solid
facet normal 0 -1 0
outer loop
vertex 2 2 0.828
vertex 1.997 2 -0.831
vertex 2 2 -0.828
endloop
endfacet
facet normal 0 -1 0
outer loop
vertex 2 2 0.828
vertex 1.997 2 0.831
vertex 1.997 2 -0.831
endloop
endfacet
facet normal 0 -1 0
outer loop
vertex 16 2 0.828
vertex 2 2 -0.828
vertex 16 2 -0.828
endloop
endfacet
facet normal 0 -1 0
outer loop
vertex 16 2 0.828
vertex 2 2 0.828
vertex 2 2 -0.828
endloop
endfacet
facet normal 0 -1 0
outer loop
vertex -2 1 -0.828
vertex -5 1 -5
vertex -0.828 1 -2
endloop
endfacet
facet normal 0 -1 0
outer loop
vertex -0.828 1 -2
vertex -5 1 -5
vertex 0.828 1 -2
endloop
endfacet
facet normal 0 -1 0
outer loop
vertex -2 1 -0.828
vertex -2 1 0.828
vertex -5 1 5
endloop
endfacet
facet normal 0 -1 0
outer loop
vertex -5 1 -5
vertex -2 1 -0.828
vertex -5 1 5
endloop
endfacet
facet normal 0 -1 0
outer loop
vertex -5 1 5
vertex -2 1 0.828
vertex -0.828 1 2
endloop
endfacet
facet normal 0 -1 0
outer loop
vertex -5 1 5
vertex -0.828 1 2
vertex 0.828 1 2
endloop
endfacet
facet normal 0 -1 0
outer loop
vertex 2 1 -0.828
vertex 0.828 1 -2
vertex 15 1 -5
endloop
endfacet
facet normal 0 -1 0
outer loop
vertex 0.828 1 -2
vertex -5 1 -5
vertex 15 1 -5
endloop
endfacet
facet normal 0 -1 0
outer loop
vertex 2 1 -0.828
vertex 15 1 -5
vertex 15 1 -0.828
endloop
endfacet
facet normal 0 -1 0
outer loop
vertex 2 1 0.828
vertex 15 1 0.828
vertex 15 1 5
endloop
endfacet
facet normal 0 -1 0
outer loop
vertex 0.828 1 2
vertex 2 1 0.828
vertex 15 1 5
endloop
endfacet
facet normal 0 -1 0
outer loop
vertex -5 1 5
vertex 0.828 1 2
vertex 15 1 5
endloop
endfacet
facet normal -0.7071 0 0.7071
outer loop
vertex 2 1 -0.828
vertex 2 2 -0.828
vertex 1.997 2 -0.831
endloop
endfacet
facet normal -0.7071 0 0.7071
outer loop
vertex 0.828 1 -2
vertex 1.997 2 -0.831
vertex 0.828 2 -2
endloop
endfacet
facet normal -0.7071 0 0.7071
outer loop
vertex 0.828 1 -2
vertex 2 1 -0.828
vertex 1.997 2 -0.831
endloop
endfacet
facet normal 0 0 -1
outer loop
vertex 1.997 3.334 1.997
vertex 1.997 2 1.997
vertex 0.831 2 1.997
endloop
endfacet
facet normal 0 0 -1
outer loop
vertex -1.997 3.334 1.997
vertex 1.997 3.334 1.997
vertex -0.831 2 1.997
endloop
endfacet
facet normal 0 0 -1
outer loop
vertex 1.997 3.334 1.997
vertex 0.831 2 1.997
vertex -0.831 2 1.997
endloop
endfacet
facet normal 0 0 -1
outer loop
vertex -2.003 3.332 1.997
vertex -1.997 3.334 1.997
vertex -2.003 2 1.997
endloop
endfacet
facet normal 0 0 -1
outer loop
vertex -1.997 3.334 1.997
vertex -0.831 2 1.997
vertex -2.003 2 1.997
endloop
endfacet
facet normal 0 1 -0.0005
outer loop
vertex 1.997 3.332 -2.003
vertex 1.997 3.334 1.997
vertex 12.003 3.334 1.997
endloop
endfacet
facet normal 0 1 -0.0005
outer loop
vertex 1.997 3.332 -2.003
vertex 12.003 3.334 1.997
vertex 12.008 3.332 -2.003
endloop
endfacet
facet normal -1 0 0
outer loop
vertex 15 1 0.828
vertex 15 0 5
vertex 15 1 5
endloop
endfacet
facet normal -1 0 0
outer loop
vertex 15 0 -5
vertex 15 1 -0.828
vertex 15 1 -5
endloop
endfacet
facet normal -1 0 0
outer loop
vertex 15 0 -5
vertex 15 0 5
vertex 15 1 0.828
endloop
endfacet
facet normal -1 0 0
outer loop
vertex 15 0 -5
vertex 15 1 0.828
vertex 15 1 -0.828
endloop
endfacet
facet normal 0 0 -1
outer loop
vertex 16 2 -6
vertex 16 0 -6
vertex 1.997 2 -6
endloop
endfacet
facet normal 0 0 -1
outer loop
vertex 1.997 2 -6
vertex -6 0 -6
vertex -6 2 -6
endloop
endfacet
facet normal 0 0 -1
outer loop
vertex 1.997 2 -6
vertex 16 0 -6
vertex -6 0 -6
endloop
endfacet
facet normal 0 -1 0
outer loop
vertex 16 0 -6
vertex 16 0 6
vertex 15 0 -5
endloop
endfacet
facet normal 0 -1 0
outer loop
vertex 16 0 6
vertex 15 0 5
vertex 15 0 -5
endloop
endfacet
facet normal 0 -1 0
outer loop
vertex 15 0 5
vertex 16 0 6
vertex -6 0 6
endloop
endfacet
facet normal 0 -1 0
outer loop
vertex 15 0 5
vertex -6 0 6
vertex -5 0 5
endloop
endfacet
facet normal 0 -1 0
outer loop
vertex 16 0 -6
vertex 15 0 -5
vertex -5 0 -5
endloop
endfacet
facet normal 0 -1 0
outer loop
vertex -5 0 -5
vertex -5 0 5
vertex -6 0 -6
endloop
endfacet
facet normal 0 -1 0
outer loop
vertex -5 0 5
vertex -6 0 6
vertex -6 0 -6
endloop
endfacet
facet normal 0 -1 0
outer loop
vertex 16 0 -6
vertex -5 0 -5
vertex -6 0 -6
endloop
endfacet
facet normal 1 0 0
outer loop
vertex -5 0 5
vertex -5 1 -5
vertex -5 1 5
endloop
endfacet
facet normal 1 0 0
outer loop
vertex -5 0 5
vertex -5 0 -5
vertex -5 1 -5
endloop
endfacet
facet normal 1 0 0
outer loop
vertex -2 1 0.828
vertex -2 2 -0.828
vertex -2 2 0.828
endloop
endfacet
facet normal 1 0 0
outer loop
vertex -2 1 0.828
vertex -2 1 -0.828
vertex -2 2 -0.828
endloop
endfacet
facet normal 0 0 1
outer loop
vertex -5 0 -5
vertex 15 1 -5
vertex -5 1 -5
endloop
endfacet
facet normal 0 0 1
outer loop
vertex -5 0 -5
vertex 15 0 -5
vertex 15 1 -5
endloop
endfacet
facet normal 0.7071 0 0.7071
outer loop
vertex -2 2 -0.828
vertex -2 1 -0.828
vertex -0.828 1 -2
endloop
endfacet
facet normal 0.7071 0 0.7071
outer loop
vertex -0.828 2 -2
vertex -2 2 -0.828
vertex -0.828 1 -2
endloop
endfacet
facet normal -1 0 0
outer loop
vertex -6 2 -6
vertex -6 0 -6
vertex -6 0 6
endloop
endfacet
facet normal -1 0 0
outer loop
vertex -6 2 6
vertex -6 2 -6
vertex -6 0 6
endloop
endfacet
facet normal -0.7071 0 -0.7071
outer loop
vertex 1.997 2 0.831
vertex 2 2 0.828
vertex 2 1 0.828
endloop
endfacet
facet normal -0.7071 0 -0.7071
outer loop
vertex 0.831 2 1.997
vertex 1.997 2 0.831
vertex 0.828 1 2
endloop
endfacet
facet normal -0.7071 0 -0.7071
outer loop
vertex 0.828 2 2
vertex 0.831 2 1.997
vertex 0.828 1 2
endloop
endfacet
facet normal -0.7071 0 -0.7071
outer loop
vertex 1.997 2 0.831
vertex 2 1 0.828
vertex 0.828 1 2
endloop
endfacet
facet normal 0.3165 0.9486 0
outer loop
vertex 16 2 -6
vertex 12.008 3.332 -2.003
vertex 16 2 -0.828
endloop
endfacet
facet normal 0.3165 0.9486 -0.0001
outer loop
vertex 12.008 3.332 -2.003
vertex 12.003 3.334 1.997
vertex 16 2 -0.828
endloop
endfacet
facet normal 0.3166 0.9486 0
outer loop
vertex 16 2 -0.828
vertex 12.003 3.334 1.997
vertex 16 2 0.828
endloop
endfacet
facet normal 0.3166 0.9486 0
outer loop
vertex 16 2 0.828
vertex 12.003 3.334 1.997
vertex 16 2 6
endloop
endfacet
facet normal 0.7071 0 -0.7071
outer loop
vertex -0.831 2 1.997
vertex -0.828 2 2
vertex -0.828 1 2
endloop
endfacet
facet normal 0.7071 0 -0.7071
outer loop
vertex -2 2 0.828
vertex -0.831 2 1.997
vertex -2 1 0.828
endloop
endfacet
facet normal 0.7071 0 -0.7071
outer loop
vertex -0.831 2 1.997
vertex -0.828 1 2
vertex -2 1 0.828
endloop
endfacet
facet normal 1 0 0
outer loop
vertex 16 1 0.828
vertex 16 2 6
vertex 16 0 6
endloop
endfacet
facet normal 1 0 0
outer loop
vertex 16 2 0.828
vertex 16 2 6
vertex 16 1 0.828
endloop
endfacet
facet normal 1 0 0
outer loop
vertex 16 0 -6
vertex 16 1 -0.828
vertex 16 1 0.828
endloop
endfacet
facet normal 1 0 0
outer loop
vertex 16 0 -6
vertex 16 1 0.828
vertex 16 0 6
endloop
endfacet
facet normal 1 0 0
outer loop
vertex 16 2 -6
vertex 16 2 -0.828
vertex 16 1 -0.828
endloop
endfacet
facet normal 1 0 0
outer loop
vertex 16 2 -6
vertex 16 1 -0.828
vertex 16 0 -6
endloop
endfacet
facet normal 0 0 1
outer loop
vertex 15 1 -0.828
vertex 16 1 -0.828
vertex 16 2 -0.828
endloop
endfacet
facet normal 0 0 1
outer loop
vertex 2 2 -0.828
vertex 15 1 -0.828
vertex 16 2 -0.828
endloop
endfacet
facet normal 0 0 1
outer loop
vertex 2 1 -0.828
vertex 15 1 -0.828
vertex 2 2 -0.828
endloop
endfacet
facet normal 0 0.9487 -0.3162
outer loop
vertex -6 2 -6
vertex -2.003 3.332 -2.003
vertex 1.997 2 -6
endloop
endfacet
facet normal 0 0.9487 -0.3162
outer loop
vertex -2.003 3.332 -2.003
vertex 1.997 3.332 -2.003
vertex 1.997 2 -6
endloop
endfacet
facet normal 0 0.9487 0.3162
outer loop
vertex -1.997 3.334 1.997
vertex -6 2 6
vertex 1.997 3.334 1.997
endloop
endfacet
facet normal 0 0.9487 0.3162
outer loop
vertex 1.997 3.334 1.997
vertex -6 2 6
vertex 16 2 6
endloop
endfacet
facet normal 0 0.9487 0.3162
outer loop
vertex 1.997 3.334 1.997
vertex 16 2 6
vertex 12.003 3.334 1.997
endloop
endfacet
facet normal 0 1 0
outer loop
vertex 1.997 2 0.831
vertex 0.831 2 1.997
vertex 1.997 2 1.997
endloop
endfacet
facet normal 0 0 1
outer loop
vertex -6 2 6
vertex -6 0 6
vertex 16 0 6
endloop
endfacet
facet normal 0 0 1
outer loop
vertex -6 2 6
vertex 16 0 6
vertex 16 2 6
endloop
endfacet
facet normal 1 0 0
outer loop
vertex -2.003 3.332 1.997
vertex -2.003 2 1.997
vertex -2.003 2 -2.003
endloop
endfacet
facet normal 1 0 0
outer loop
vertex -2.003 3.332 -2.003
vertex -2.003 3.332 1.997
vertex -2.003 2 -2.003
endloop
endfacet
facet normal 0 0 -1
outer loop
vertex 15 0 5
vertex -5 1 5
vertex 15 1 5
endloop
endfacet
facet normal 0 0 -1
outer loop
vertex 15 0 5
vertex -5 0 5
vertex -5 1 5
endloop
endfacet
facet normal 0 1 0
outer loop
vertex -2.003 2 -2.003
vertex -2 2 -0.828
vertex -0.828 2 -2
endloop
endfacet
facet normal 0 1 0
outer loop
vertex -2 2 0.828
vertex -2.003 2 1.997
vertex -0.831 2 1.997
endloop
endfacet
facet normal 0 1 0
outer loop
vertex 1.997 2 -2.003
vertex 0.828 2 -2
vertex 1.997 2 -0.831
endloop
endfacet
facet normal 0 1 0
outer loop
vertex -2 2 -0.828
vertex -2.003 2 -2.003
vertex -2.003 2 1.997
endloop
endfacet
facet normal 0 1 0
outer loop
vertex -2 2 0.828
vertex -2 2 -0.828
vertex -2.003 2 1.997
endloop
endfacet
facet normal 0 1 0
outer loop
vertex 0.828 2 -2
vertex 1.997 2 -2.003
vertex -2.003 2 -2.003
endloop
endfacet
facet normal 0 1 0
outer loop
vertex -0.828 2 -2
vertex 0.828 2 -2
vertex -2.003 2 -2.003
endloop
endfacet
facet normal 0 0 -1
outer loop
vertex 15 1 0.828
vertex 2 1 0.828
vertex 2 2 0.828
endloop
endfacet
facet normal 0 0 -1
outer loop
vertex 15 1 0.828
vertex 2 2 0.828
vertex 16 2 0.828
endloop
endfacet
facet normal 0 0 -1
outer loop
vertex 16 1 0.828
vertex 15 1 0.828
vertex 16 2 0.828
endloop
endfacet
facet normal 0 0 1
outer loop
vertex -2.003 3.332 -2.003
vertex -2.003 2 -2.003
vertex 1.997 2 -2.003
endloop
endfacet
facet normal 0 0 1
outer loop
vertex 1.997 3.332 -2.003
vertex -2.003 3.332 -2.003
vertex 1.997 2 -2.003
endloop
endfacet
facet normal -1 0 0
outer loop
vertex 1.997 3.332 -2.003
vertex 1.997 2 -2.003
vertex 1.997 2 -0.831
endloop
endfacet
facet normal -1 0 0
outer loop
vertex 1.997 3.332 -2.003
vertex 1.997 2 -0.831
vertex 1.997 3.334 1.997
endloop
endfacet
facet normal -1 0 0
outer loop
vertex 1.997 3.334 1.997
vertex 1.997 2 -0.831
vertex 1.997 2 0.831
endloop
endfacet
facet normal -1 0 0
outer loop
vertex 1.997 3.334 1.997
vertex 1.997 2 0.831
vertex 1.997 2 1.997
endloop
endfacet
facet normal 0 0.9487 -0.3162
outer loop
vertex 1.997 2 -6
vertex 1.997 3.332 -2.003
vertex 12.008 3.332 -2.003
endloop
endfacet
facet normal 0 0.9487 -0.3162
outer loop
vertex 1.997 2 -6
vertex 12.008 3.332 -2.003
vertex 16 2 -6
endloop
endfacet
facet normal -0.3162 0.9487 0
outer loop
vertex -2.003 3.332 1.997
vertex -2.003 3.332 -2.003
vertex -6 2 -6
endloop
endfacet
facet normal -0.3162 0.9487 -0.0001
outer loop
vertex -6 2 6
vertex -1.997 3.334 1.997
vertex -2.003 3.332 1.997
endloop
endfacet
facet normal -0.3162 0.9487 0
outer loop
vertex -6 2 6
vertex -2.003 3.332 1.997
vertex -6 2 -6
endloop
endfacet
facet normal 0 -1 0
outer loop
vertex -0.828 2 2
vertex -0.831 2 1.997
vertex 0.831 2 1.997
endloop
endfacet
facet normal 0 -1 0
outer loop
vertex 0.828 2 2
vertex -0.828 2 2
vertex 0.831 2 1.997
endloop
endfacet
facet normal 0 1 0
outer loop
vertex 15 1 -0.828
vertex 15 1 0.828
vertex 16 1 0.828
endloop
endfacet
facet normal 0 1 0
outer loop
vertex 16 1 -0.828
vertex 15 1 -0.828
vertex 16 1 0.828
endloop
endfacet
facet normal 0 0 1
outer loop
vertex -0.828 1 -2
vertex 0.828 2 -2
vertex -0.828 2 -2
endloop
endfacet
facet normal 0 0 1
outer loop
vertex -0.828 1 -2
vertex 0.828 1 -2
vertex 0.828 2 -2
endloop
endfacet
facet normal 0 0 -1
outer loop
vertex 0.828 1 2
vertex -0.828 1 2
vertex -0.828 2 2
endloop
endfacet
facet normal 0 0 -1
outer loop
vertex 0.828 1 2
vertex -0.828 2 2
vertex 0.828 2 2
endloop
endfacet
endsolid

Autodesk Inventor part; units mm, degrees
ref_plane "YZ Plane" through (0, 0, 0) normal (1, 0, 0) x (0, 1, 0)
ref_plane "XZ Plane" through (0, 0, 0) normal (0, 1, 0) x (-1, 0, 0)
ref_plane "XY Plane" through (0, 0, 0) normal (0, 0, 1) x (1, 0, 0)
sketch "Sketch1" plane through (0, 0, 0) normal (0, 1, 0) x (-1, 0, 0)
  line L0 (5, 5) -> (-5, 5)
  line L1 (-5, 5) -> (-5, -5)
  line L2 (-5, -5) -> (5, -5)
  line L3 (5, -5) -> (5, 5)
  line L4 (6, 6) -> (-6, 6)
  line L5 (-6, 6) -> (-6, -6)
  line L6 (-6, -6) -> (6, -6)
  line L7 (6, -6) -> (6, 6)
  point P0 (0, 0)
  dimension "d0" = 10
  dimension "d1" = 10
  dimension "d2" = 5
  dimension "d3" = 5
  dimension "d4" = 12
  dimension "d5" = 12
  dimension "d6" = 1
  dimension "d7" = 1
extrude "Extrusion1" add sketch "Sketch1" along normal blind 2
sketch "Sketch2" plane through (6, 0, 6) normal (1, 0, 0) x (0, 0, -1)
  line L0 (0, 0) -> (0, 2) projected
  line L1 (12, 0) -> (12, 2) projected
  line L2 (0, 2) -> (12, 2)
  line L3 (12, 2) -> (12, 1)
  line L4 (12, 1) -> (0, 1)
  line L5 (0, 1) -> (0, 2)
  point P0 (6, 0)
extrude "Extrusion2" add sketch "Sketch2" against normal blind 11.5
sketch "Sketch3" plane through (0, 2, 0) normal (0, 1, 0) x (1, 0, 0)
  line L0 (-2, -2) -> (2, -2)
  line L1 (2, -2) -> (2, 2)
  line L2 (2, 2) -> (-2, 2)
  line L3 (-2, 2) -> (-2, -2)
  circle A0 centre (0, 0) radius 2.8284
  line L4 (0, -2.8284) -> (-2.8284, 0)
  line L5 (-2.8284, 0) -> (0, 2.8284)
  line L6 (2.8284, 0) -> (0, 2.8284)
  line L7 (2.8284, 0) -> (0, -2.8284)
  point P0 (0.8284, -2)
  point P1 (2, -0.8284)
  point P2 (2, 0.8284)
  point P3 (0.8284, 2)
  point P4 (-0.8284, 2)
  point P5 (-2, 0.8284)
  point P6 (-2, -0.8284)
  point P7 (-0.8284, -2)
  dimension "d13" = 4
  dimension "d14" = 4
  dimension "d15" = 2
  dimension "d16" = 2
extrude "Extrusion3" cut sketch "Sketch3" along normal blind 23.25 and the other way blind 11.625 contours L4 L3 L5 L2 L6 L1 L7 L0
sketch "Sketch4" plane through (0, 2, 0) normal (0, 1, 0) x (1, 0, 0)
  line L0 (2, -0.8284) -> (2, 0.8284) projected
  line L1 (2, -0.8284) -> (2.8765, -0.8284)
  line L2 (2.8765, -0.8284) -> (2.8765, 0.8284)
  line L3 (2.8765, 0.8284) -> (2, 0.8284)
  line L4 (2, 0.8284) -> (2, -0.8284)
  line L5 (2.8765, -0.8284) -> (7.5124, -0.8284)
  line L6 (7.5124, -0.8284) -> (7.5124, 0.8284)
  line L7 (7.5124, 0.8284) -> (2.8765, 0.8284)
  line L8 (2.8765, 0.8284) -> (2.8765, -0.8284)
  point P0 (0, 0)
  point P1 (2.8765, 0.8284)
  point P2 (2, 0.8284)
extrude "Extrusion4" cut sketch "Sketch4" against normal blind 1
sketch "Sketch5" plane through (0, 2, 0) normal (0, 1, 0) x (1, 0, 0)
  line L0 (-6, -6) -> (6, -6) projected
  line L1 (6, 0.8284) -> (6, 6) projected
  line L2 (-6, -6) -> (6, -6)
  line L3 (6, -6) -> (6, 6)
  line L4 (6, 6) -> (-6, 6)
  line L5 (-6, 6) -> (-6, -6)
  point P0 (0, 0)
  point P1 (6, -6)
extrude "Extrusion5" add sketch "Sketch5" along normal blind 25
sketch "Sketch6" plane through (6, 0, 6) normal (1, 0, 0) x (0, 0, -1)
  line L0 (5.1716, 1) -> (5.1716, 2) projected
  line L1 (5.1716, 2) -> (-3.596, 2)
  line L2 (0, 0) -> (0, 27) projected
  line L3 (4, 2) -> (5.1716, 2) projected
  line L4 (5.1716, 2) -> (16.1787, 2)
  line L5 (5.1716, 2) -> (6.8284, 2) projected
  line L6 (6, 2) -> (6, 6)
  line L7 (0, 2) -> (6, 4)
  line L8 (6, 4) -> (12, 2)
  line L9 (12, 0) -> (12, 27) projected
  line L10 (12, 2) -> (-2.4689, 2)
  line L11 (-2.4689, 2) -> (-2.4689, 28.669)
  line L12 (-2.4689, 28.669) -> (12, 28.669)
  line L13 (12, 28.669) -> (12, 2)
  point P0 (6, 0)
  dimension "d23" = 4
extrude "Extrusion6" cut sketch "Sketch6" against normal blind 23.25 contours L1 L11 L12 L13 L9 L8 L7
sketch "Sketch7" plane through (-6, 0, 6) normal (0, 0, 1) x (1, 0, 0)
  line L0 (6, 0) -> (6, 4)
  line L1 (12, 4) -> (0, 4) projected
  line L2 (0, 2) -> (12, 2) projected
  line L3 (12, 2) -> (6, 4)
  line L4 (0, 4) -> (0, 2) projected
  line L5 (6, 4) -> (0, 2)
  line L6 (0, 2) -> (13.6732, 2)
  line L7 (13.6732, 2) -> (13.6732, 4.9606)
  line L8 (13.6732, 4.9606) -> (0, 4.9606)
  line L9 (0, 4.9606) -> (0, 2)
extrude "Extrusion7" cut sketch "Sketch7" against normal blind 41.75 contours L5 L4 L1 | L1 L9 L8 L7 L6 L3
sketch "Sketch8" plane through (0, 2, 0) normal (0, -1, 0) x (1, 0, 0)
  line L0 (6, 6) -> (0, 0) projected
  line L1 (1.9974, 1.9974) -> (-2.0026, 1.9974)
  line L2 (-2.0026, 1.9974) -> (-2.0026, -2.0026)
  line L3 (-2.0026, -2.0026) -> (1.9974, -2.0026)
  line L4 (1.9974, -2.0026) -> (1.9974, 1.9974)
  dimension "d30" = 4
  dimension "d31" = 4
extrude "Extrusion8" cut sketch "Sketch8" against normal blind 105
sketch "Sketch9" plane through (6, 0, 6) normal (1, 0, 0) x (0, 0, -1)
  line L0 (0, 0) -> (0, 2) projected
  line L1 (12, 0) -> (12, 2) projected
  line L2 (0, 0) -> (12, 0)
  line L3 (12, 0) -> (12, 2)
  line L4 (12, 2) -> (0, 2)
  line L5 (0, 2) -> (0, 0)
  point P0 (6, 0)
extrude "Extrusion9" add sketch "Sketch9" along normal blind 10
sketch "Sketch10" plane through (0, 0, 0) normal (0, -1, 0) x (1, 0, 0)
  line L0 (5, -5) -> (5, 5) projected
  line L1 (5, 5) -> (15, 5)
  line L2 (15, 5) -> (15, -5)
  line L3 (15, -5) -> (5, -5)
  line L4 (5, -5) -> (5, 5)
  point P0 (0, 0)
  dimension "d36" = 10
extrude "Extrusion10" cut sketch "Sketch10" against normal up to surface (1 mm away)
sketch "Sketch11" plane through (6, 2, 6) normal (0, 1, 0) x (1, 0, 0)
  line L0 (10, 0) -> (10, 12) projected
  line L1 (0, 0) -> (-4.0026, 4.0026) projected
  line L2 (10, 12) -> (-4.0026, 12)
  line L3 (-4.0026, 12) -> (-4.0026, 4.0026)
  line L4 (-4.0026, 4.0026) -> (10, 4.0026)
  line L5 (10, 4.0026) -> (10, 12)
  line L6 (-12, 0) -> (10, 0) projected
  line L7 (-4.0026, 4.0026) -> (10, 4.0026)
  line L8 (10, 4.0026) -> (10, 0)
  line L9 (10, 0) -> (-4.0026, 0)
  line L10 (-4.0026, 0) -> (-4.0026, 4.0026)
  point P0 (-6, 6)
extrude "Extrusion11" add sketch "Sketch11" along normal blind 1.5 contours L6 L1 L4 L0 | L4 L3 L2 L0
sketch "Sketch12" plane through (16, 0, 6) normal (1, 0, 0) x (0, 0, -1)
  line L0 (0, 2) -> (12, 2) projected
  line L1 (4.0026, 3.3342) -> (0, 2) projected
  line L2 (4.0026, 2) -> (4.0026, 3.3342) projected
  line L3 (0, 2) -> (4.0026, 3.3342)
  line L4 (4.0026, 3.3325) -> (8.0026, 3.3325) projected
  line L5 (4.0026, 3.3342) -> (8.0026, 3.3325)
  line L6 (12, 0) -> (12, 2) projected
  line L7 (8.0026, 3.3325) -> (12, 2)
  line L8 (0, 2) -> (-1.9464, 6.2775)
  line L9 (-1.9464, 6.2775) -> (14.9869, 5.8247)
  line L10 (14.9869, 5.8247) -> (12, 2)
  point P0 (6, 0)
extrude "Extrusion12" cut sketch "Sketch12" against normal blind 26 contours L8 L9 L10 L7 L4 L1
sketch "Sketch13" plane through (-6, 0, 6) normal (0, 0, 1) x (1, 0, 0)
  line L0 (3.9974, 2) -> (3.9974, 3.3325) projected
  line L1 (4.0026, 3.3342) -> (0, 2) projected
  line L2 (3.9974, 3.3325) -> (0, 3.3325)
  line L3 (0, 3.3325) -> (0, 2)
  line L4 (0, 2) -> (3.9974, 2)
  line L5 (3.9974, 2) -> (3.9974, 3.3325)
  line L6 (22, 2) -> (0, 2) projected
  line L7 (22, 3.3342) -> (4.0026, 3.3342) projected
  line L8 (22, 2) -> (18.0026, 2)
  line L9 (18.0026, 2) -> (18.0026, 3.3342)
  line L10 (18.0026, 3.3342) -> (22, 3.3342)
  line L11 (22, 3.3342) -> (22, 2)
  line L12 (18.0026, 3.3342) -> (22, 2)
  point P0 (6, 0)
  dimension "d43" = 3.9974
  dimension "d44" = 3.9974
extrude "Extrusion13" cut sketch "Sketch13" against normal blind 17.75 contours L12 L7 L11
sketch "Sketch14" plane through (-5, 1, -5) normal (0, -1, 0) x (1, 0, 0)
  line L0 (11, 5.8284) -> (11, 4.1716) projected
  line L1 (11, 5.8284) -> (19.699, 5.8284)
  line L2 (19.699, 5.8284) -> (19.699, 4.1716)
  line L3 (19.699, 4.1716) -> (11, 4.1716)
  line L4 (11, 4.1716) -> (11, 5.8284)
  line L5 (19.699, 4.1716) -> (21.7329, 4.1716)
  line L6 (21.7329, 4.1716) -> (21.7329, 5.8284)
  line L7 (21.7329, 5.8284) -> (19.699, 5.8284)
  line L8 (19.699, 5.8284) -> (19.699, 4.1716)
  point P0 (5, 5)
extrude "Extrusion14" cut sketch "Sketch14" against normal up to surface (1 mm away)
sketch "Sketch15" plane through (0, 0, 0) normal (0, -1, 0) x (1, 0, 0)
  point P0 (0, 0)
equation "\"d2\" = 0.5 * d0"
equation "\"d3\" = 0.5 * d1"
equation "\"d15\" = 0.5 * d13"
equation "\"d16\" = 0.5 * d14"
equation "\"d44\" = d43"
equation "\"BendRadius\" = Thickness"
equation "\"BendReliefWidth\" = Thickness"
equation "\"BendReliefDepth\" = 0.5 * Thickness"
equation "\"CornerReliefSize\" = 4 * Thickness"
equation "\"MinimumRemnant\" = 2 * Thickness"
equation "\"TransitionRadius\" = BendRadius"
equation "\"JacobiRadiusSize\" = BendRadius"
equation "\"GapSize\" = Thickness"
equation "\"Thickness\" = 0.5"
properties part number "modelGatePoklice1"
